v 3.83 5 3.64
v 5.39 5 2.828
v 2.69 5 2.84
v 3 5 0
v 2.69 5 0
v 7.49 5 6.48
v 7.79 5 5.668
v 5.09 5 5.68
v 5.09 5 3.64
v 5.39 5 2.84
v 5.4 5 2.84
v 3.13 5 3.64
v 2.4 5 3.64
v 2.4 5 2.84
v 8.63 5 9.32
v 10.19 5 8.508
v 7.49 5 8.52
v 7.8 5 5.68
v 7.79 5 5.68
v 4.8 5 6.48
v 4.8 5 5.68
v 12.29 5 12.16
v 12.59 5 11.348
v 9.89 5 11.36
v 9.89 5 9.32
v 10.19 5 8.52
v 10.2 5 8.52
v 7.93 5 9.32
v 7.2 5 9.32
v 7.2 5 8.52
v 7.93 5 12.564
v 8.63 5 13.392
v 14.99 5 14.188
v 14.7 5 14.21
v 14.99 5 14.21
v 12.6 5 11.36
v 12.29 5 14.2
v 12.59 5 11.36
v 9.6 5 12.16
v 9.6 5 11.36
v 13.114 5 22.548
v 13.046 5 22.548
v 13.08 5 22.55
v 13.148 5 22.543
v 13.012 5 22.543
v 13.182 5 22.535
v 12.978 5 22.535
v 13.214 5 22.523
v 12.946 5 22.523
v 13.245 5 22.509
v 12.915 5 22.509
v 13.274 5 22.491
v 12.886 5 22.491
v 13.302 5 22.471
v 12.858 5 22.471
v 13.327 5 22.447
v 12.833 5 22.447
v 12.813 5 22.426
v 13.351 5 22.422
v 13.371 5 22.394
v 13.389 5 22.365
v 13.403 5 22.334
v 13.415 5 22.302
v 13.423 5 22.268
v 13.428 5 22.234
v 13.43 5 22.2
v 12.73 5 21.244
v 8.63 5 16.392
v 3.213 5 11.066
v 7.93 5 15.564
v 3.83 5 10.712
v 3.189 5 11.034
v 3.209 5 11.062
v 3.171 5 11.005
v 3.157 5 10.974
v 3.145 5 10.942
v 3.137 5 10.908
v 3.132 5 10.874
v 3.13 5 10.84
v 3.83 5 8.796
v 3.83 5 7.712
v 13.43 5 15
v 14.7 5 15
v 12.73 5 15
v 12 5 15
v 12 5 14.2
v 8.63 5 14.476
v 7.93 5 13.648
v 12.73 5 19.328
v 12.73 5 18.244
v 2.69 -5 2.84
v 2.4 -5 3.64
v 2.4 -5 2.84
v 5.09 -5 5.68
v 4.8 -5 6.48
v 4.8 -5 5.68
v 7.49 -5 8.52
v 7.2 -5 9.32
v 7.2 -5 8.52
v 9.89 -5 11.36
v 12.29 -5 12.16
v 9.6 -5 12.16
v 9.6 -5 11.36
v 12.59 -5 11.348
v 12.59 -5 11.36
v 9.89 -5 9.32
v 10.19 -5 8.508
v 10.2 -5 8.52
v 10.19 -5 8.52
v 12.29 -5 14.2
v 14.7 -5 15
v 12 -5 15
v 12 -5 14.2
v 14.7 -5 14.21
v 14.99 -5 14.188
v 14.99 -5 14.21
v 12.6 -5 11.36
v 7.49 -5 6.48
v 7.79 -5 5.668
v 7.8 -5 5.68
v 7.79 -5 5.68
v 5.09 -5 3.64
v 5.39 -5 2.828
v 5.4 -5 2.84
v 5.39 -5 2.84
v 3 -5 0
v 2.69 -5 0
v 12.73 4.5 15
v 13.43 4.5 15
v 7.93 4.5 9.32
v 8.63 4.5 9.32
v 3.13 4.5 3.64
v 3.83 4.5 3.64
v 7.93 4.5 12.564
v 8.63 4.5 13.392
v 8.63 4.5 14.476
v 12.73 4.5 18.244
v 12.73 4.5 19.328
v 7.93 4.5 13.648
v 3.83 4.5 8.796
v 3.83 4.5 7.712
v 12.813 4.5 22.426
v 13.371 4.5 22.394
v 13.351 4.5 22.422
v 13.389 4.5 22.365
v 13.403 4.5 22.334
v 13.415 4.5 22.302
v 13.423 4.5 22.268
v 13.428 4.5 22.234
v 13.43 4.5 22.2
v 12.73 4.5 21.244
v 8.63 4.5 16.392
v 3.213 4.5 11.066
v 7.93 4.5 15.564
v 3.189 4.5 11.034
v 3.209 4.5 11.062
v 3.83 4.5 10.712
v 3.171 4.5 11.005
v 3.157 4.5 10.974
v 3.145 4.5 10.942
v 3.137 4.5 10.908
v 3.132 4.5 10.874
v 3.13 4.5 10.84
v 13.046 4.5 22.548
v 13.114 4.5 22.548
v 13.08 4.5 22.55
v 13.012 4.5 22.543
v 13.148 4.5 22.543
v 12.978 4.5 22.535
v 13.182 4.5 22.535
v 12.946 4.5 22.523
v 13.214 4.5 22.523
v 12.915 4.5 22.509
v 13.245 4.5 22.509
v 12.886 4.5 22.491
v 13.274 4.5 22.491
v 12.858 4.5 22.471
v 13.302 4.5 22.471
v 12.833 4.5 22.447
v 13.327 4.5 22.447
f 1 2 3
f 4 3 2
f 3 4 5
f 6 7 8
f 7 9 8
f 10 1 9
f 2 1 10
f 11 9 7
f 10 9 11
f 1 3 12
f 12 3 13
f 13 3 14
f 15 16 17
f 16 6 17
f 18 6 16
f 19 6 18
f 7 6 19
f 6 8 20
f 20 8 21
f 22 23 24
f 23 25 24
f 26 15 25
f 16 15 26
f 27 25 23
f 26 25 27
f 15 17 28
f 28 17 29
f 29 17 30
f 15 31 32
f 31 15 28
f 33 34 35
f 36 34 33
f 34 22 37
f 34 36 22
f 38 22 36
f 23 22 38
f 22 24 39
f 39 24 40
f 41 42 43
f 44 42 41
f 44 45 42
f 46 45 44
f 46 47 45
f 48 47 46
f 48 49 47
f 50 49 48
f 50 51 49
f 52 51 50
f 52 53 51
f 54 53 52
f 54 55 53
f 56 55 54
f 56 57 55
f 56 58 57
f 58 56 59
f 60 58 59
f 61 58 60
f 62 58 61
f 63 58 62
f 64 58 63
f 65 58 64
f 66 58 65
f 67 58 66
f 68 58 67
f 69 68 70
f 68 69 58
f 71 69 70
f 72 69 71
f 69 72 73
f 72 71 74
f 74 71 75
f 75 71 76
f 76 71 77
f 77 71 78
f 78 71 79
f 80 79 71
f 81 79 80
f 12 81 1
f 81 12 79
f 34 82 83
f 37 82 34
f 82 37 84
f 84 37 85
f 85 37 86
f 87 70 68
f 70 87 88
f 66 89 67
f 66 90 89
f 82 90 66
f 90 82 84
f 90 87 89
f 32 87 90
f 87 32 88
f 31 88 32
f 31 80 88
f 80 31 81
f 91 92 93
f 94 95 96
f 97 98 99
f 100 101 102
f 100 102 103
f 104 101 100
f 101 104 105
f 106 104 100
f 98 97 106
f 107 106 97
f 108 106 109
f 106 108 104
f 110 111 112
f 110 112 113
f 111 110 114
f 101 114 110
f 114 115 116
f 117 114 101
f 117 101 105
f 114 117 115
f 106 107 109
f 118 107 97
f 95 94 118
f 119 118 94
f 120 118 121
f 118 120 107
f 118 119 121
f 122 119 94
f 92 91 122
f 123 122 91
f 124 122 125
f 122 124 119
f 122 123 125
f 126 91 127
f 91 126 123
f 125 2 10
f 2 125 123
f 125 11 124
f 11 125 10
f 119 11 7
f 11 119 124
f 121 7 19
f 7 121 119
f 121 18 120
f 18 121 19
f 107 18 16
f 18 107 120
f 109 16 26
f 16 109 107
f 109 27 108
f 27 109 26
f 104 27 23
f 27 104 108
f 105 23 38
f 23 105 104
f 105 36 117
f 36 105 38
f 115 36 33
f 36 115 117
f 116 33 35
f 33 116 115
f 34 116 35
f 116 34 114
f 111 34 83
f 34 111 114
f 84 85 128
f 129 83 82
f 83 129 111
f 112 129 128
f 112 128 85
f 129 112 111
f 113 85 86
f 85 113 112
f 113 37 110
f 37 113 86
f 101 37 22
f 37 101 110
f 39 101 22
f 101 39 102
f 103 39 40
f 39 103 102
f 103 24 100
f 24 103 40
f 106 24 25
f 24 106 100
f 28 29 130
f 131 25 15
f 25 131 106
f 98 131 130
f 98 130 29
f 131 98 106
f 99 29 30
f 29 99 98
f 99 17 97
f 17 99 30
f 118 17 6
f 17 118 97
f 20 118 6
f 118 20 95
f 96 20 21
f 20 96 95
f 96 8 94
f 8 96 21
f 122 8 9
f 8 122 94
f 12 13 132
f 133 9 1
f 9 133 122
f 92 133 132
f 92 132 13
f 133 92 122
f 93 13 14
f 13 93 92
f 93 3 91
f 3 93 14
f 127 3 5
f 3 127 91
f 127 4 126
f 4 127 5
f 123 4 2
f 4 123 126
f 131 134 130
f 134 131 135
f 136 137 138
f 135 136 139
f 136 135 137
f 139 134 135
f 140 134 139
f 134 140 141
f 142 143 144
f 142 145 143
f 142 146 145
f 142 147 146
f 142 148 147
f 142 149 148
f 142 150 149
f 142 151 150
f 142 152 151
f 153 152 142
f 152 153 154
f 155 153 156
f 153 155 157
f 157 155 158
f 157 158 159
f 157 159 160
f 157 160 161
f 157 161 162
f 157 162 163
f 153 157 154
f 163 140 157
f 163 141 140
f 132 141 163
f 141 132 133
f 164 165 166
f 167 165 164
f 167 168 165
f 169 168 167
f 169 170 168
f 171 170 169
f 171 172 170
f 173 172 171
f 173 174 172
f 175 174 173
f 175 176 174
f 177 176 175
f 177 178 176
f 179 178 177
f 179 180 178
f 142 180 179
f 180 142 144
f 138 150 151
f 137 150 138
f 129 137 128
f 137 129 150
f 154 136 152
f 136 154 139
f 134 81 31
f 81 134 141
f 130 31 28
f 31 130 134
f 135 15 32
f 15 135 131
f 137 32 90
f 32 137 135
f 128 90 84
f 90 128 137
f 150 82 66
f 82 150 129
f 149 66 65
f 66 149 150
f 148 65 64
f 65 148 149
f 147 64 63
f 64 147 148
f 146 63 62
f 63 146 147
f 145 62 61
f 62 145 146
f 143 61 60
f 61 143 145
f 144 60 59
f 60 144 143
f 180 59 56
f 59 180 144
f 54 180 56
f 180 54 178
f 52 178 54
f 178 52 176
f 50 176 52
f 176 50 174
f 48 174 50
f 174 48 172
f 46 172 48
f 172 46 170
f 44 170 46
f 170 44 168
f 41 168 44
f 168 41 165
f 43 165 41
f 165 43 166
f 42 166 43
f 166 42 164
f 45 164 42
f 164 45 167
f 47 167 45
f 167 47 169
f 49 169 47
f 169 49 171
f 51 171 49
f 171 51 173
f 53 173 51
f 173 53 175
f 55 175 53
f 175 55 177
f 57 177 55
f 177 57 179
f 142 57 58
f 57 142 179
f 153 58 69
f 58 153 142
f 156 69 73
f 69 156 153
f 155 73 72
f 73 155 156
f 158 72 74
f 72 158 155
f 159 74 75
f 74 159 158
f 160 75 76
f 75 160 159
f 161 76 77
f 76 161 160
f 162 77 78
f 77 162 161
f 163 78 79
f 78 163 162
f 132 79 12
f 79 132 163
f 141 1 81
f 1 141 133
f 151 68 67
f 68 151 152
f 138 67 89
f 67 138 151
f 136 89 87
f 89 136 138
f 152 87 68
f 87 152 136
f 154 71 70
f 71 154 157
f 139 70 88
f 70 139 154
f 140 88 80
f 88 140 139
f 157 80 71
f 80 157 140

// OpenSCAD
$fn = 64;

height = 15;
width  =  10.0;

step_size       = [2.7, 0.8];
step_overhang   = 0.3;
step_count      = 6;

BIAS= 0.01;
X_AXIS = [1, 0, 0];


rotate(90, X_AXIS) linear_extrude(width, center=true) {
    for (i = [1 : step_count - 1]) {
        step_height = (height - step_size[1]) / (step_count - 1);
        translate([
            i * (step_size[0] - step_overhang),
            i * step_height
        ]) {
            render() difference() {
                union() {
                    square(step_size);
                    translate([step_overhang - BIAS, -step_height]) {
                        square([step_size[0], step_height+BIAS]);
                    }
                }
                a = atan((step_size[0] - step_overhang) / step_height);
                translate([step_size[0] + .3, 0]) {
                    rotate(-90-a) translate([-1.4 * step_size[0],0]) {
                        square([
                            1.4 * step_size[0] * 2,
                            1.4 * step_height
                        ]);
                    }
                }
            }
        }
    }
}

handrail_tickness = [0.7, 0.5];

handrail_height = 8.0;

rotate(90, X_AXIS) translate([0,0,-width/2]) {
    translate([step_size[0] * .4, 0])linear_extrude(handrail_tickness[1]) {
       step_height = (height - step_size[1]) / (step_count - 1);
       for (i = [1 : 2 : step_count - 1]) {
            
            translate([
                i * (step_size[0] - step_overhang),
                i * step_height
            ]) {
                translate([-handrail_tickness[0]/2, 0]) {
                    square([handrail_tickness[0], handrail_height]);
                }
                translate([0, handrail_height]) {
                    circle(d=handrail_tickness[0]);
                }
            }
        }
        
        for (o=[0,3]) {
            translate([
                (step_size[0] - step_overhang),
                step_height + handrail_height - o
            ]) {
                l = sqrt(pow((step_size[0] - step_overhang),2) 
                       + pow(step_height,2)) * (step_count - 2);
                a = atan((step_size[0] - step_overhang)/step_height);
                echo(a);
                rotate(-a) translate([-handrail_tickness[0]/2, 0]) {
                    square([handrail_tickness[0], l]);
                }
            }
        }
    }
}
	
	
	
